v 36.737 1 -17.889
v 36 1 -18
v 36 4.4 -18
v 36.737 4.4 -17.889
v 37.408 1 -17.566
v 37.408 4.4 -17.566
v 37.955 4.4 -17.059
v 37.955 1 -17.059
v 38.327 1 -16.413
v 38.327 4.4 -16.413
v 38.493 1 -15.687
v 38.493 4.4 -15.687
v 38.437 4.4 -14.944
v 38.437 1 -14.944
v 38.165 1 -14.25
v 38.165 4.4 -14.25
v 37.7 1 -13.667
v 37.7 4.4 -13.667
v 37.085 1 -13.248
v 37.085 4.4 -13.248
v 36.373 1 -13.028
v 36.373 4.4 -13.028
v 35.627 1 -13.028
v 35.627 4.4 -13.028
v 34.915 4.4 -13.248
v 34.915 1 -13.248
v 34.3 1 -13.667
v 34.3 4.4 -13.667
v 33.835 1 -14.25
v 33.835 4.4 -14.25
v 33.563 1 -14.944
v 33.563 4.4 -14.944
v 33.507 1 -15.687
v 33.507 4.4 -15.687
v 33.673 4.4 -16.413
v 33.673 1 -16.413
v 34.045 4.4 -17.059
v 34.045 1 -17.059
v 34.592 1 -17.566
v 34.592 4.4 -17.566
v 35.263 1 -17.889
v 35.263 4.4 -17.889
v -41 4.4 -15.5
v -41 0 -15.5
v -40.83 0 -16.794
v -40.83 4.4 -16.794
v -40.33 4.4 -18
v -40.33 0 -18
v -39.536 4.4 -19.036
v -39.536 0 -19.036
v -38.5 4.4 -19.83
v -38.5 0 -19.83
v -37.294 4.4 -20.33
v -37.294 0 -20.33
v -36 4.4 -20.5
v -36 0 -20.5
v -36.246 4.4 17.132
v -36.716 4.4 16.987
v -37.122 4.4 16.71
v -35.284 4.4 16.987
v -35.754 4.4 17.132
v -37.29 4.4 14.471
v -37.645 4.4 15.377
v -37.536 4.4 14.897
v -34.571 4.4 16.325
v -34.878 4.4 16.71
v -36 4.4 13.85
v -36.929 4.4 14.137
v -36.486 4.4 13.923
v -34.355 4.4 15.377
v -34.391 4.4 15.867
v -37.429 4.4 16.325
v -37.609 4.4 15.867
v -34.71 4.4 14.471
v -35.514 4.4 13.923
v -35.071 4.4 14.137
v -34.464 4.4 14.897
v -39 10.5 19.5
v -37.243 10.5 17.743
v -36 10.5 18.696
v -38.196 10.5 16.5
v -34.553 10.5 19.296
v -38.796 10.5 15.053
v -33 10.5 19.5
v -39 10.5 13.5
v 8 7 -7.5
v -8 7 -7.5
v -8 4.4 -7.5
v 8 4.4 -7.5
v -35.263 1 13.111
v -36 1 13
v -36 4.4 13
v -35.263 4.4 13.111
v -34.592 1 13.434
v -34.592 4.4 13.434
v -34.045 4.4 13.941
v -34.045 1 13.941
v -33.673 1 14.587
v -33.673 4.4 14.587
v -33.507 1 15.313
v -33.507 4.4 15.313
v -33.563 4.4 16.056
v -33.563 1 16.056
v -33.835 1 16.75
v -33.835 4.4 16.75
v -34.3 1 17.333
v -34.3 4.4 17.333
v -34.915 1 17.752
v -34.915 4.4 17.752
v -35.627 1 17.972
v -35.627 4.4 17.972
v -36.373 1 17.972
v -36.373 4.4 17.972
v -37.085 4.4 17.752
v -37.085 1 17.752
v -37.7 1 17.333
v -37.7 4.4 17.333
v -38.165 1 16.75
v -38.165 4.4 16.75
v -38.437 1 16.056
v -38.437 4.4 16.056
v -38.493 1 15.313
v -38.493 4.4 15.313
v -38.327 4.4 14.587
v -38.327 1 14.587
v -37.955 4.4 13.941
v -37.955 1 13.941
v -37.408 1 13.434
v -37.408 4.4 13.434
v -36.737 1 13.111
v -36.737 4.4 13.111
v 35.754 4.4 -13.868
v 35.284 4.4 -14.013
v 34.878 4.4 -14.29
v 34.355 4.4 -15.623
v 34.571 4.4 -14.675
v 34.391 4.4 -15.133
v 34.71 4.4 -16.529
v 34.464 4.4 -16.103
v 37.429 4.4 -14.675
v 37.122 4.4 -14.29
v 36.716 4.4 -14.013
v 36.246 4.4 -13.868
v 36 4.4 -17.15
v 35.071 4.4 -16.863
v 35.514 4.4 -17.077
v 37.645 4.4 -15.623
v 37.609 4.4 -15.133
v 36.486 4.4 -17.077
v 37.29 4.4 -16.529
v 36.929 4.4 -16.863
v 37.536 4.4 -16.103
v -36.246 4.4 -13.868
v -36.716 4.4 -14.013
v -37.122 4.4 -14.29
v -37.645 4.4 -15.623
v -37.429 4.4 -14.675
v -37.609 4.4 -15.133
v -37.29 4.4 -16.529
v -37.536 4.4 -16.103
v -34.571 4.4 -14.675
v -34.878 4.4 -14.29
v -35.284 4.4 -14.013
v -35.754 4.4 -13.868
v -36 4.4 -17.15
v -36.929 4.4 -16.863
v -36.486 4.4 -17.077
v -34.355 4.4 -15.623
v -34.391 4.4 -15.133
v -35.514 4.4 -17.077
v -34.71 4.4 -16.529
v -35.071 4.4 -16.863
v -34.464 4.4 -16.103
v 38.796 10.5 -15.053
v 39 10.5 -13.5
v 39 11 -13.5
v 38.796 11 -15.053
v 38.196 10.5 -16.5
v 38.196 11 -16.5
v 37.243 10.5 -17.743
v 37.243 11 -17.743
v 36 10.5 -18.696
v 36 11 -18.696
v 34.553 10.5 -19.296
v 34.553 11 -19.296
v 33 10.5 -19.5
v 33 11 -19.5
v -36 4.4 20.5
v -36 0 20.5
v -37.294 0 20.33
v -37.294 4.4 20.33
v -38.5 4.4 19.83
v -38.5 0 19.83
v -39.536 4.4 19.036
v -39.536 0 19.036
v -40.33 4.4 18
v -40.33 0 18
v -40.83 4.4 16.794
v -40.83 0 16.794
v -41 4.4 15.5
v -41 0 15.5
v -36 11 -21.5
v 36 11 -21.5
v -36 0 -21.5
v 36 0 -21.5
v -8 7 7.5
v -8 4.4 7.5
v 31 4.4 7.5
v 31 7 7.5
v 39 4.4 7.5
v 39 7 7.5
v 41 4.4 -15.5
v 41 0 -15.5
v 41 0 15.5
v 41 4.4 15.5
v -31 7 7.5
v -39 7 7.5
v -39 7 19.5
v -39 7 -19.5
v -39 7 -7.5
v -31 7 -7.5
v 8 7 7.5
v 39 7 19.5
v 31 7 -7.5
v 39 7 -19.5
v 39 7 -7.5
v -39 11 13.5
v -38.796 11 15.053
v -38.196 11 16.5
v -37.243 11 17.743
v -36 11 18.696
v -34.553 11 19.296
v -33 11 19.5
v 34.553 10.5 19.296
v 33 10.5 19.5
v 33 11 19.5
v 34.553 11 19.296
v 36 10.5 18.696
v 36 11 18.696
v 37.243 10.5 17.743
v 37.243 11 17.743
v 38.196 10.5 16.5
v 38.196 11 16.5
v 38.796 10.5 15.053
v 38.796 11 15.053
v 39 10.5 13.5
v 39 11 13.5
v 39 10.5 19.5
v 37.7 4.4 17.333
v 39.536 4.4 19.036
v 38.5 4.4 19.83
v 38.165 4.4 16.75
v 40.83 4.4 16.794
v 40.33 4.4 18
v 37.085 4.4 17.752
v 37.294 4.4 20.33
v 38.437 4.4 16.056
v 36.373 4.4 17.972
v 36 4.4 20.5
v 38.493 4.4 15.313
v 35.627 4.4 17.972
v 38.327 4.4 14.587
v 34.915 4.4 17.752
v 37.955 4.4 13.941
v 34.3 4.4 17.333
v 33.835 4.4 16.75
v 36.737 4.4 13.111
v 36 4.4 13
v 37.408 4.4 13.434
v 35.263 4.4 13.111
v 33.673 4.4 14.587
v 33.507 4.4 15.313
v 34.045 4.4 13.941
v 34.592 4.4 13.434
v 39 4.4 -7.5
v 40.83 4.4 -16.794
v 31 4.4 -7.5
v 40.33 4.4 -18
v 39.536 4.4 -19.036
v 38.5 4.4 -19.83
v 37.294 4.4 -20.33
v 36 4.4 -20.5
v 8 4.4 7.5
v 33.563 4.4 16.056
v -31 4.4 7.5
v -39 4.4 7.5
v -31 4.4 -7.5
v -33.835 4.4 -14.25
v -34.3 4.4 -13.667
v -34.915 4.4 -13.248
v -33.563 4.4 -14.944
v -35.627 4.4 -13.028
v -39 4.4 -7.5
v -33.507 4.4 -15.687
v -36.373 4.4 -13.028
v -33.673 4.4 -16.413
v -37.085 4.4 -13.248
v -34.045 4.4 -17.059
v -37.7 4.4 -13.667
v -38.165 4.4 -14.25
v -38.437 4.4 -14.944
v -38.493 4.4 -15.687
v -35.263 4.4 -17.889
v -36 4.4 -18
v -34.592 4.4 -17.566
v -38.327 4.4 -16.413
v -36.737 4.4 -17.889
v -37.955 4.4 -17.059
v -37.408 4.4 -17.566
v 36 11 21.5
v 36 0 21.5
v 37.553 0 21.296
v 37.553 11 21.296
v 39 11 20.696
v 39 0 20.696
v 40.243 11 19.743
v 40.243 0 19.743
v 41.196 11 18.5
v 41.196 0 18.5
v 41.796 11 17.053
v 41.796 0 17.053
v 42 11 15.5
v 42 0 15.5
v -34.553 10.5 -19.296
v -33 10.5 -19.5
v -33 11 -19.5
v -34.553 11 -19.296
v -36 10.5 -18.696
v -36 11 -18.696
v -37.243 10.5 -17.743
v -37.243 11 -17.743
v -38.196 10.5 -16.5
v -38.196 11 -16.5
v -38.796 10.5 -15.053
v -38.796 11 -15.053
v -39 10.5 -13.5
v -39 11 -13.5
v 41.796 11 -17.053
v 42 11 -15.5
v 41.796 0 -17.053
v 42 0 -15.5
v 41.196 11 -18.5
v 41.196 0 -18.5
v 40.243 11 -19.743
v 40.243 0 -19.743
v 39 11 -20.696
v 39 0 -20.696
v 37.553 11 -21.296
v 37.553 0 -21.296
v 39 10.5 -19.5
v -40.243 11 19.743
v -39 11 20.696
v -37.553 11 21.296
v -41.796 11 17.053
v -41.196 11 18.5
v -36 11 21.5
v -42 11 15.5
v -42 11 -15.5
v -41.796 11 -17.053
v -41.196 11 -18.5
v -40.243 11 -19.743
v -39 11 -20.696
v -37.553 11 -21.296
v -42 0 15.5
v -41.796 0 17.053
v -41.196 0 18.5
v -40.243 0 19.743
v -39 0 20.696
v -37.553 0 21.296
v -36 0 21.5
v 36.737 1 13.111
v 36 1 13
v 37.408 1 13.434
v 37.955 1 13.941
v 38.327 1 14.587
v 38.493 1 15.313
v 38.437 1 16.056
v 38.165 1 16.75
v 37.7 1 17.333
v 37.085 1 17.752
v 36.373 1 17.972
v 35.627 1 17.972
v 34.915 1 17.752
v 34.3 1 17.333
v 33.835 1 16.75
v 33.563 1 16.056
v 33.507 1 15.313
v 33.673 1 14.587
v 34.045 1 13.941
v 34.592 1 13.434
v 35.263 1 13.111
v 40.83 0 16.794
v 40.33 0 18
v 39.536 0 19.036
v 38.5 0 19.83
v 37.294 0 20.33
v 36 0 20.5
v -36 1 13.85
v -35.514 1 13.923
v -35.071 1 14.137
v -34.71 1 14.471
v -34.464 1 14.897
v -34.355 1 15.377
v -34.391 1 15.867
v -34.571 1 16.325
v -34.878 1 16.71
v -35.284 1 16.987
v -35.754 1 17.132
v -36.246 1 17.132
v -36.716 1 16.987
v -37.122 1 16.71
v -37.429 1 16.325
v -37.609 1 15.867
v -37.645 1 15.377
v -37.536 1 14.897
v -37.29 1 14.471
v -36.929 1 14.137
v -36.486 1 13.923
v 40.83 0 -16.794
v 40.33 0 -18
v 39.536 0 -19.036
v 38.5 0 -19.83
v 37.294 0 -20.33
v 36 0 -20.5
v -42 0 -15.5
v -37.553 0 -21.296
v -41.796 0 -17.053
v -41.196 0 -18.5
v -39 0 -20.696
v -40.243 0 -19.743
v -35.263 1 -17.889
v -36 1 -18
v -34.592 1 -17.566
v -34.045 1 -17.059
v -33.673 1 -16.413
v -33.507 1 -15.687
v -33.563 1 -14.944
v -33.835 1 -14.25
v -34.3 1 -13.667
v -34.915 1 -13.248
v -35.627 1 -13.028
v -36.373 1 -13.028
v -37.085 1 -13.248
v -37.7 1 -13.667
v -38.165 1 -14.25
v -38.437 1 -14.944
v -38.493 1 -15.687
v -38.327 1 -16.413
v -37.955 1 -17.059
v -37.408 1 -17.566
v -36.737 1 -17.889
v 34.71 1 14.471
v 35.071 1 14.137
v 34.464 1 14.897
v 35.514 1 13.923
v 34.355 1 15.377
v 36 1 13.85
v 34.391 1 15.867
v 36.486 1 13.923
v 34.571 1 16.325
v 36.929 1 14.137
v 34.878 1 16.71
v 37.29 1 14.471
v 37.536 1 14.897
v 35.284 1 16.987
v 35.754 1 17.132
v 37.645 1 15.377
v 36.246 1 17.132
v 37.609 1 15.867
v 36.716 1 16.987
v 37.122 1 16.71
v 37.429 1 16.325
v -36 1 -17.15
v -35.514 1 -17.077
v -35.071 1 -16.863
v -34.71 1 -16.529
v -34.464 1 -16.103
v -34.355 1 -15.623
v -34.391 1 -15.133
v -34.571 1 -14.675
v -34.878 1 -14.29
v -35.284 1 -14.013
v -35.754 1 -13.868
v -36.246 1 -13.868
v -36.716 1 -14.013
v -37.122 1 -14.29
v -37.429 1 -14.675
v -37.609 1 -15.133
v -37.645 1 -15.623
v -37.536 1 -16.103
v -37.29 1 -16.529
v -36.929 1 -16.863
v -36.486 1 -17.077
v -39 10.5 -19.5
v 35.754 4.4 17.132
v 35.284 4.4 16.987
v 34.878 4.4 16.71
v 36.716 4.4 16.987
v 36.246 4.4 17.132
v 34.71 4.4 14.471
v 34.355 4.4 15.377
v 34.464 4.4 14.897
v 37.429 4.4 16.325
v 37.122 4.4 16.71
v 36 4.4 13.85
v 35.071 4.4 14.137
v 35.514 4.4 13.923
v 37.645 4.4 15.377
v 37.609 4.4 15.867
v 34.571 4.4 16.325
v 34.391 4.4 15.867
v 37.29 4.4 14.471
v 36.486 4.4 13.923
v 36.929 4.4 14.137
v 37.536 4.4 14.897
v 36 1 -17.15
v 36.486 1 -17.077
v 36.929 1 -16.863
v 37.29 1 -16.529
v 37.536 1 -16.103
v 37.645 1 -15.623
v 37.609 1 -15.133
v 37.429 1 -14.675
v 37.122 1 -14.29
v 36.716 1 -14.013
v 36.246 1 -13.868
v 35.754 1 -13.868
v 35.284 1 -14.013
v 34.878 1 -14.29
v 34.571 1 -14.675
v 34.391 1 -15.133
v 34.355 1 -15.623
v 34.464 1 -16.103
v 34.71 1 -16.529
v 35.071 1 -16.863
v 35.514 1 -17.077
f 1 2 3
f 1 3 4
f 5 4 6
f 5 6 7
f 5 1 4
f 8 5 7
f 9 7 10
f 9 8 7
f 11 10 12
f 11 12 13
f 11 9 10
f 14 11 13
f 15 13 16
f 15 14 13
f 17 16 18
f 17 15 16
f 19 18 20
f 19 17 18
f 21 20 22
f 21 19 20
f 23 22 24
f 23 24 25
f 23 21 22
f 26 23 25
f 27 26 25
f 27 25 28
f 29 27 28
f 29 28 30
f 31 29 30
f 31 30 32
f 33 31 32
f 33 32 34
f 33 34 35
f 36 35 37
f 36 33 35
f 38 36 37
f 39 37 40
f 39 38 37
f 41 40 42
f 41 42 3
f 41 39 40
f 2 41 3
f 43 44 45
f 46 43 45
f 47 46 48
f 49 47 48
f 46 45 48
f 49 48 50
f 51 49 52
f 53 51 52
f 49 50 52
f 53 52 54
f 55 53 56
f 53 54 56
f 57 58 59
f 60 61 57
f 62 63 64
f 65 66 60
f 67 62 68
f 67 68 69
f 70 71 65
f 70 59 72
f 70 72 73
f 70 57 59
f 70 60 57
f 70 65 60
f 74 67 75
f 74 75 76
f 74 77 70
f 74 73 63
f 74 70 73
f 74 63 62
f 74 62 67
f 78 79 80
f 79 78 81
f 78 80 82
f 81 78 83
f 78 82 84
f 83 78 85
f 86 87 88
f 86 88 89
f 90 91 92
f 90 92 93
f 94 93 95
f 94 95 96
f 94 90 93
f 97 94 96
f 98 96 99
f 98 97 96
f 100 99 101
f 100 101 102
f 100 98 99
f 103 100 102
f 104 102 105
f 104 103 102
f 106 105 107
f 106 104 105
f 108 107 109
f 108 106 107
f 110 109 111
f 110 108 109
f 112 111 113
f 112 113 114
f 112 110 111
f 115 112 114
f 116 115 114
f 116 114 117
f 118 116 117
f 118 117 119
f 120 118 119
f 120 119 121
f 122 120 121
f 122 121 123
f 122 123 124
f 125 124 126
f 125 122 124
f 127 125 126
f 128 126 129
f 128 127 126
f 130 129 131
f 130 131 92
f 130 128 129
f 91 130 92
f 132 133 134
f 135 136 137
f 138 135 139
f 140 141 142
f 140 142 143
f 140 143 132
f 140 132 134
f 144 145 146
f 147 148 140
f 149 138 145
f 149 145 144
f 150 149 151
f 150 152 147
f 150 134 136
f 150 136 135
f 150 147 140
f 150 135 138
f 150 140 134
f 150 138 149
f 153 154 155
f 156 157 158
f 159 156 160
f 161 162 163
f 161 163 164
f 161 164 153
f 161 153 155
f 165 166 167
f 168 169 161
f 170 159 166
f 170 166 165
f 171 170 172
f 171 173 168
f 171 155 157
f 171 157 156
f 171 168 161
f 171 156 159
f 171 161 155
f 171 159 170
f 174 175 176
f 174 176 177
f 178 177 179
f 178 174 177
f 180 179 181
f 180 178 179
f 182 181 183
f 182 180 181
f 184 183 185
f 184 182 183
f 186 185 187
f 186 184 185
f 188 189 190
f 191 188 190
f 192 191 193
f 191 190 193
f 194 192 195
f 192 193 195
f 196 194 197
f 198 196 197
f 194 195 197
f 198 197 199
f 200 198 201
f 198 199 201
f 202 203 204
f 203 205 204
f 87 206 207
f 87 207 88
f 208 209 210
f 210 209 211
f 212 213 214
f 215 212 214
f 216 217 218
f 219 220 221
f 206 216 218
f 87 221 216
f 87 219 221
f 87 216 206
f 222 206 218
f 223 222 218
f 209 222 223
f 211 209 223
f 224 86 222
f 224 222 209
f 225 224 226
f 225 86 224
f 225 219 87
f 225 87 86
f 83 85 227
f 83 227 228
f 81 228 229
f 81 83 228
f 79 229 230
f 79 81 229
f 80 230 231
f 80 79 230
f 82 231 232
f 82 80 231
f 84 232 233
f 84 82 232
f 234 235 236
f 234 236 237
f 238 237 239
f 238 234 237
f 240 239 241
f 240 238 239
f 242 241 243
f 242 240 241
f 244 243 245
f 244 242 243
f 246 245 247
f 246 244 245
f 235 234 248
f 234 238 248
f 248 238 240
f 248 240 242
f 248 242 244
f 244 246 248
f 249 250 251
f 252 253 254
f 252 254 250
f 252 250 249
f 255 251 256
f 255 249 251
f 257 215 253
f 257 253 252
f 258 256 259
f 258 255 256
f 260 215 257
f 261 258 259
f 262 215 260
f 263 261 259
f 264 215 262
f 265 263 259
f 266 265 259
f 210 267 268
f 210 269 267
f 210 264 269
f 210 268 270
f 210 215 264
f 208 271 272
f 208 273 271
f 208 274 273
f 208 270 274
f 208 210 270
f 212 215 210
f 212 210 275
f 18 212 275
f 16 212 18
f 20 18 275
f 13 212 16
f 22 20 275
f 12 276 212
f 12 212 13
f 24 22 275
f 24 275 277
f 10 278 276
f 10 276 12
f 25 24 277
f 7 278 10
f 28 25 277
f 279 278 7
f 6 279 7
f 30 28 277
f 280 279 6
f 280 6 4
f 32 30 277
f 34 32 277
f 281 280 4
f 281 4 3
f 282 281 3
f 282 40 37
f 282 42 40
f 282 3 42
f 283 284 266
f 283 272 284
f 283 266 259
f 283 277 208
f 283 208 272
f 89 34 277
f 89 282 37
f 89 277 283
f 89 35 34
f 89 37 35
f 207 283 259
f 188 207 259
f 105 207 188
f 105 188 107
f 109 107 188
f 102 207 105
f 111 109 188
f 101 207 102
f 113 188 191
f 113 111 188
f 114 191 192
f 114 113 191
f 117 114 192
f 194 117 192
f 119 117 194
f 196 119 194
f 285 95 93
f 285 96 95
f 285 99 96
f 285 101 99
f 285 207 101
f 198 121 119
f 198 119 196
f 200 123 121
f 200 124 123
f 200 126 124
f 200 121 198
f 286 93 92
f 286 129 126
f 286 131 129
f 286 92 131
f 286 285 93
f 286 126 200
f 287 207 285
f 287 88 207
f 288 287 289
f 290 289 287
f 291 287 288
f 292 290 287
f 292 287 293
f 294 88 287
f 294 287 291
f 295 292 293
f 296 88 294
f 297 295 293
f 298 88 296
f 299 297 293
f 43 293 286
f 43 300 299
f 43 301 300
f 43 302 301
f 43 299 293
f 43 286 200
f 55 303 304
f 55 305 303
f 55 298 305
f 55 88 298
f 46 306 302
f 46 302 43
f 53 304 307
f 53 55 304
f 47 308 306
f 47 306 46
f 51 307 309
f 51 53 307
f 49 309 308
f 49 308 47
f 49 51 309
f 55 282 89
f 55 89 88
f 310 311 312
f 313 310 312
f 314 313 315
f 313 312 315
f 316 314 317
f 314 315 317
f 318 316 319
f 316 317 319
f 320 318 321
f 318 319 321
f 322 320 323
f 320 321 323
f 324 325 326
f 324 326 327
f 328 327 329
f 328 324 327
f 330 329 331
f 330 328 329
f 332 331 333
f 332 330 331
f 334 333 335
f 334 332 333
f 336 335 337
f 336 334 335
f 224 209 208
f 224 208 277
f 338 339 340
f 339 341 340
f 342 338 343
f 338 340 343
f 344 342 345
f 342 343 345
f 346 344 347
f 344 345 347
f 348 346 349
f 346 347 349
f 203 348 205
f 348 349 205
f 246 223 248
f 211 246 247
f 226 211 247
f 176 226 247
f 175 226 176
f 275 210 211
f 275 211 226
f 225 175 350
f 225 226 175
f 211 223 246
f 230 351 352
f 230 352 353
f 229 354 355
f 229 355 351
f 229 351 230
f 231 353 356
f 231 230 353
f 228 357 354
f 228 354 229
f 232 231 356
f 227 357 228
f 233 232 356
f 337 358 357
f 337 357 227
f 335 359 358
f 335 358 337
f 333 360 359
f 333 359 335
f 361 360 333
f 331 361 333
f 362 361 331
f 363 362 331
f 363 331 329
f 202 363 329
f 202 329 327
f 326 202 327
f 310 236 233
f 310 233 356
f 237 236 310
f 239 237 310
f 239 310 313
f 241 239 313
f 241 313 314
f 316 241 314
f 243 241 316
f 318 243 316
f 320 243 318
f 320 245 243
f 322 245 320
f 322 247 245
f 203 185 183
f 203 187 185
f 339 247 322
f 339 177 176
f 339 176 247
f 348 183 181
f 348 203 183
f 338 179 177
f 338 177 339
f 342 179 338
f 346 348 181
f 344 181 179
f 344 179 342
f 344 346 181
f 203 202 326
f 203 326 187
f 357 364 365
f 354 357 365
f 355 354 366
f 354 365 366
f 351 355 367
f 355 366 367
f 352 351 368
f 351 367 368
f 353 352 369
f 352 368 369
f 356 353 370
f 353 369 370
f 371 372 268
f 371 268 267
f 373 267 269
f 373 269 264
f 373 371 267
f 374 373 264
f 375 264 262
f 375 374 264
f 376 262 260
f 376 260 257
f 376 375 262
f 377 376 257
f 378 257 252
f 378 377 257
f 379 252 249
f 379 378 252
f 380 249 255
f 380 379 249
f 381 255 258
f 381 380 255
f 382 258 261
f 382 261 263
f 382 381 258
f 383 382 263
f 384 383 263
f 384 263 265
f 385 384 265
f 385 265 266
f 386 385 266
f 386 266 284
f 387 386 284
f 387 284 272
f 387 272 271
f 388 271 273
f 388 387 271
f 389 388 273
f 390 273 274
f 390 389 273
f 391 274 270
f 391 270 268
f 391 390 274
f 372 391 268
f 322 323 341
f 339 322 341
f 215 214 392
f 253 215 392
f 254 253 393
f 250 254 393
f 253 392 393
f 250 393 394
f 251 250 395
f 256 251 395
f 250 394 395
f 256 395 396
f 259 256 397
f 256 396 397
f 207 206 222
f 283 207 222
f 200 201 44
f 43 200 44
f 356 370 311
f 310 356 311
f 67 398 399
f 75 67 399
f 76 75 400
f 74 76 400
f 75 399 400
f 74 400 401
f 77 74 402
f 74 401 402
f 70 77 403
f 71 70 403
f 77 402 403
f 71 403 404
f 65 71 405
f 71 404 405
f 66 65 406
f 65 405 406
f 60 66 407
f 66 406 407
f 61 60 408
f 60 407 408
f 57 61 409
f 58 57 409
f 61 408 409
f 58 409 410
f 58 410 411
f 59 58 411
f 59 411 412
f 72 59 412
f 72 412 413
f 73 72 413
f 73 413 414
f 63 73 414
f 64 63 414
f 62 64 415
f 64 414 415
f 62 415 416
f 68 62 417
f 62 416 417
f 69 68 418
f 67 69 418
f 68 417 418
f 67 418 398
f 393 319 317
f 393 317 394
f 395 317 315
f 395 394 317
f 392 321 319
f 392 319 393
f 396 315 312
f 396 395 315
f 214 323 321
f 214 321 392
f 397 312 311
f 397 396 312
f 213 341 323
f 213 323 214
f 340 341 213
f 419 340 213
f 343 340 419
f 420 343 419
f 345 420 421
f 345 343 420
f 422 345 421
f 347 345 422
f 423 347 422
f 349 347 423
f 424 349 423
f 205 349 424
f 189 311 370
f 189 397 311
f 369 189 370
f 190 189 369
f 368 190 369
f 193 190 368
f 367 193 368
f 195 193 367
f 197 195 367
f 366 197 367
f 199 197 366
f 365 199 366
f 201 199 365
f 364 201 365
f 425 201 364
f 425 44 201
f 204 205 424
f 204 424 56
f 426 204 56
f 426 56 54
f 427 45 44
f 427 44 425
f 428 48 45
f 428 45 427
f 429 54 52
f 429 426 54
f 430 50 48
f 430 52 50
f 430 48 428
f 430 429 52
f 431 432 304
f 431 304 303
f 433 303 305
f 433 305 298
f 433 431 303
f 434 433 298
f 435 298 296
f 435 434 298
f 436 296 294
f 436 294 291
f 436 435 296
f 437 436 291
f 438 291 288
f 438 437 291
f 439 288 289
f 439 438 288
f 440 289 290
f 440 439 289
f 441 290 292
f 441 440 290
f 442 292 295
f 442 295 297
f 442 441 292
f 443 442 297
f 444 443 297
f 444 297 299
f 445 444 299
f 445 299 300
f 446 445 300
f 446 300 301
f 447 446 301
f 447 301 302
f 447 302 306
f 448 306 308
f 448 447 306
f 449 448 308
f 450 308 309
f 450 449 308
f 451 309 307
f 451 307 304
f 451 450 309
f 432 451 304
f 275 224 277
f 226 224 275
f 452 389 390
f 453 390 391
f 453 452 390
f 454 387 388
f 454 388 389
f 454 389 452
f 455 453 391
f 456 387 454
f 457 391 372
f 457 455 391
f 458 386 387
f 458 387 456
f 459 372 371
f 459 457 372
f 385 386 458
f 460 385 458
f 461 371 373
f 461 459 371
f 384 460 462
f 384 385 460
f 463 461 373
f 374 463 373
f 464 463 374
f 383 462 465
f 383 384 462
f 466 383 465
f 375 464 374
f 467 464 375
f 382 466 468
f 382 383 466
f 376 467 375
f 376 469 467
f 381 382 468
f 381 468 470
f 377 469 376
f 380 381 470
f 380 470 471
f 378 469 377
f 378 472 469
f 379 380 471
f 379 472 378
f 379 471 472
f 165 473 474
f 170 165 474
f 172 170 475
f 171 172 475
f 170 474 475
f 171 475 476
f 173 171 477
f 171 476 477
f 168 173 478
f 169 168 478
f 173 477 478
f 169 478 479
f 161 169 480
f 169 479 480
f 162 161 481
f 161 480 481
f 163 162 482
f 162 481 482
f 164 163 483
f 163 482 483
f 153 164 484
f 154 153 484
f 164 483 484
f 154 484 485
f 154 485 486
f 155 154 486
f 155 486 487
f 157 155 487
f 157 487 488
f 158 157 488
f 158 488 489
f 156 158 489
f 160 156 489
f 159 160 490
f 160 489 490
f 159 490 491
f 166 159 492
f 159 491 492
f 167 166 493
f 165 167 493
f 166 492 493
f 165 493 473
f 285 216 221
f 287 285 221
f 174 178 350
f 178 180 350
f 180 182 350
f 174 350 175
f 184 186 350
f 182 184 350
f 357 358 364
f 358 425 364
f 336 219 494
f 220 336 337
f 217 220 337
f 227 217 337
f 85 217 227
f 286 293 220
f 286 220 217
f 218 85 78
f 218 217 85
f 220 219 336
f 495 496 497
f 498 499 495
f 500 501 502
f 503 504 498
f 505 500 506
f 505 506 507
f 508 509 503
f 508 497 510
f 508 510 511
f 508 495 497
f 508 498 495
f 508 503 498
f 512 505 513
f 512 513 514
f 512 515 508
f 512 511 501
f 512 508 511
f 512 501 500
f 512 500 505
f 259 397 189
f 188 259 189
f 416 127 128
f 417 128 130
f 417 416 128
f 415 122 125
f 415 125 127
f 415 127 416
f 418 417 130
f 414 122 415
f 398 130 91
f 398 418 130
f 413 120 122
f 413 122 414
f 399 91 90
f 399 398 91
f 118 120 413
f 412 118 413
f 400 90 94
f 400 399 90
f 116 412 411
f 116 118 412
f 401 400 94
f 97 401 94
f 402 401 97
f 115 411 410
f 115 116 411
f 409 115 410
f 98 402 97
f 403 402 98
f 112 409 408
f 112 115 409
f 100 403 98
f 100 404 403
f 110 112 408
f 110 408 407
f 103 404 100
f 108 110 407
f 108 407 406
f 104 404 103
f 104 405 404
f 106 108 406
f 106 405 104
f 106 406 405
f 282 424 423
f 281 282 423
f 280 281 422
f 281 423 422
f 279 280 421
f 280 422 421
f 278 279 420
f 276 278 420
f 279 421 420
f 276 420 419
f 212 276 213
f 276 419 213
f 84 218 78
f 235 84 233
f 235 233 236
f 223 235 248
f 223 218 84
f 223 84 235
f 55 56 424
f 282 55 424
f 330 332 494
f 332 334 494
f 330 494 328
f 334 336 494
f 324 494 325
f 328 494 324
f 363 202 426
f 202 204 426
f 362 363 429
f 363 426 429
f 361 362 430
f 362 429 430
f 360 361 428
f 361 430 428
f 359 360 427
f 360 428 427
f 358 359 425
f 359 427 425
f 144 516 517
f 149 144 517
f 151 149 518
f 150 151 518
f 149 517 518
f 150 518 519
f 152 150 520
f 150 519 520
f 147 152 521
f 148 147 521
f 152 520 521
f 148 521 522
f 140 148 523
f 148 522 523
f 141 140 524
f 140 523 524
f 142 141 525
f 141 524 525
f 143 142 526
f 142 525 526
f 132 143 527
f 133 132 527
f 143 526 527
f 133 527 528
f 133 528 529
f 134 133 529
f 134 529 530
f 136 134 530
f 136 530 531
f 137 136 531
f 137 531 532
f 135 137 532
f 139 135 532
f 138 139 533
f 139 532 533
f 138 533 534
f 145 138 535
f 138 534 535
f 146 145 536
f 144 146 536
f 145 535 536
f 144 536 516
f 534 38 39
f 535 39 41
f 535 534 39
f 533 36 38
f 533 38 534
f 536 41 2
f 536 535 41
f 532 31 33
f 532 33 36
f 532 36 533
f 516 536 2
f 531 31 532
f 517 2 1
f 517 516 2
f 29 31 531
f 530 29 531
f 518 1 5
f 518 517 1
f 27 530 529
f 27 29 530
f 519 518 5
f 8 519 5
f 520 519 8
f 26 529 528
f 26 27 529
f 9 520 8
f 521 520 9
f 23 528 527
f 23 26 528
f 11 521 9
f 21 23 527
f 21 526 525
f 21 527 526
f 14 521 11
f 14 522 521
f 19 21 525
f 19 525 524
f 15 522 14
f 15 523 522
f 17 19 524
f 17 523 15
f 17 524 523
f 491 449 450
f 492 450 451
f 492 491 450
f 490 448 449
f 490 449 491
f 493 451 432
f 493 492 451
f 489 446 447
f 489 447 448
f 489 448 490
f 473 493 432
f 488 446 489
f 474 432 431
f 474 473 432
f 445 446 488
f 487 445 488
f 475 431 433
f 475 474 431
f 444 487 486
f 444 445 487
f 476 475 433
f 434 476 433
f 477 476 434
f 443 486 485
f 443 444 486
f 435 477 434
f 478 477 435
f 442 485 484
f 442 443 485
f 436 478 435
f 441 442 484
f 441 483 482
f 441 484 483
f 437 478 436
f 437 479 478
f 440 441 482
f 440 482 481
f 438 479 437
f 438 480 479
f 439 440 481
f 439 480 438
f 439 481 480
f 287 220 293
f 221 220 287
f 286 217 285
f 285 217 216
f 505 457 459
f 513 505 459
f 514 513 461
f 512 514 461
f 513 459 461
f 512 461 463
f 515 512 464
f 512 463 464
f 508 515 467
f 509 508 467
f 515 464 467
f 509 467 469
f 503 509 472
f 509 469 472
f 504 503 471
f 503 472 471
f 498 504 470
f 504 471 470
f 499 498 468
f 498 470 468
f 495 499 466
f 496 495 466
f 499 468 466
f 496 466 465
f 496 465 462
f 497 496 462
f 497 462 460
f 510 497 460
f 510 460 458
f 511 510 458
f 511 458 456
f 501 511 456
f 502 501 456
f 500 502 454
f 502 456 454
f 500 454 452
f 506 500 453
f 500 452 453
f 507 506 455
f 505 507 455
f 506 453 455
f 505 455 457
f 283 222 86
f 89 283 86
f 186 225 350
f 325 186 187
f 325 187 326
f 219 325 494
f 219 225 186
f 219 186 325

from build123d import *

# Parameters (mm, degrees)
EXTRUDE_1_DEPTH     = 10.5
CUT_EXTRUDE_1_DEPTH = 1
SKETCH_3_R          = 2.5
SKETCH_3_R_2        = 1.65
CUT_EXTRUDE_2_DEPTH = 3.4
SKETCH_4_W          = 78
SKETCH_4_H          = 39
CUT_EXTRUDE_3_DEPTH = 3.5
SKETCH_5_W          = 8
SKETCH_5_H          = 15
CUT_EXTRUDE_4_DEPTH = 48.699580711
SKETCH_6_W          = 16
SKETCH_6_H          = 15
CUT_EXTRUDE_5_DEPTH = 48.699580711
EXTRUDE_2_DEPTH     = 0.5


with BuildPart() as part:
    # 草图1 → 凸台-拉伸1 (new body)
    with BuildSketch(Plane(origin=(0, 0, 0), x_dir=(1, 0, 0), z_dir=(0, 1, 0))):
        with BuildLine():
            Line((-36, 21.5), (36, 21.5))
            ThreePointArc((36, 21.5), (40.242640687, 19.742640687), (42, 15.5))
            Line((42, 15.5), (42, -15.5))
            ThreePointArc((42, -15.5), (40.242640687, -19.742640687), (36, -21.5))
            Line((36, -21.5), (-36, -21.5))
            ThreePointArc((-36, -21.5), (-40.242640687, -19.742640687), (-42, -15.5))
            Line((-42, -15.5), (-42, 15.5))
            ThreePointArc((-42, 15.5), (-40.242640687, 19.742640687), (-36, 21.5))
        make_face()
    extrude(amount=EXTRUDE_1_DEPTH)

    # 草图2 → 切除-拉伸1 (cut)
    with BuildSketch(Plane.XZ):
        with BuildLine():
            Line((36, 20.5), (-36, 20.5))
            ThreePointArc((-36, 20.5), (-39.535533906, 19.035533906), (-41, 15.5))
            Line((-41, 15.5), (-41, -15.5))
            ThreePointArc((-41, -15.5), (-39.535533906, -19.035533906), (-36, -20.5))
            Line((-36, -20.5), (36, -20.5))
            ThreePointArc((36, -20.5), (39.535533906, -19.035533906), (41, -15.5))
            Line((41, -15.5), (41, 15.5))
            ThreePointArc((41, 15.5), (39.535533906, 19.035533906), (36, 20.5))
        make_face()
    extrude(amount=-CUT_EXTRUDE_1_DEPTH, mode=Mode.SUBTRACT)

    # 草图3 → 切除-拉伸2 (cut)
    # profile 1 of 5: a face of its own
    with BuildSketch(Plane(origin=(0, 1, 0), x_dir=(-1, 0, 0), z_dir=(0, -1, 0))):
        with BuildLine():
            Line((-41, 15.5), (-41, -15.5))
            ThreePointArc((-41, -15.5), (-39.535533906, -19.035533906), (-36, -20.5))
            Line((-36, -20.5), (36, -20.5))
            ThreePointArc((36, -20.5), (39.535533906, -19.035533906), (41, -15.5))
            Line((41, -15.5), (41, 15.5))
            ThreePointArc((41, 15.5), (39.535533906, 19.035533906), (36, 20.5))
            Line((36, 20.5), (-36, 20.5))
            ThreePointArc((-36, 20.5), (-39.535533906, 19.035533906), (-41, 15.5))
        make_face()
        with Locations(Location((36, 15.5, 0), (0, 0, 90))):
            Circle(SKETCH_3_R, mode=Mode.SUBTRACT)
        with Locations(Location((36, -15.5, 0), (0, 0, 90))):
            Circle(SKETCH_3_R, mode=Mode.SUBTRACT)
        with Locations(Location((-36, 15.5, 0), (0, 0, 90))):
            Circle(SKETCH_3_R, mode=Mode.SUBTRACT)
        with Locations(Location((-36, -15.5, 0), (0, 0, 90))):
            Circle(SKETCH_3_R, mode=Mode.SUBTRACT)
    # profile 2 of 5: a face of its own
    with BuildSketch(Plane(origin=(0, 1, 0), x_dir=(-1, 0, 0), z_dir=(0, -1, 0))):
        with Locations(Location((36, 15.5, 0), (0, 0, 90))):
            Circle(SKETCH_3_R_2)
    # profile 3 of 5: a face of its own
    with BuildSketch(Plane(origin=(0, 1, 0), x_dir=(-1, 0, 0), z_dir=(0, -1, 0))):
        with Locations(Location((36, -15.5, 0), (0, 0, 90))):
            Circle(SKETCH_3_R_2)
    # profile 4 of 5: a face of its own
    with BuildSketch(Plane(origin=(0, 1, 0), x_dir=(-1, 0, 0), z_dir=(0, -1, 0))):
        with Locations(Location((-36, -15.5, 0), (0, 0, 90))):
            Circle(SKETCH_3_R_2)
    # profile 5 of 5: a face of its own
    with BuildSketch(Plane(origin=(0, 1, 0), x_dir=(-1, 0, 0), z_dir=(0, -1, 0))):
        with Locations(Location((-36, 15.5, 0), (0, 0, 90))):
            Circle(SKETCH_3_R_2)
    extrude(amount=-CUT_EXTRUDE_2_DEPTH, mode=Mode.SUBTRACT)

    # 草图4 → 切除-拉伸3 (cut)
    with BuildSketch(Plane(origin=(0, 10.5, 0), x_dir=(1, 0, 0), z_dir=(0, 1, 0))):
        Rectangle(SKETCH_4_W, SKETCH_4_H)
    extrude(amount=-CUT_EXTRUDE_3_DEPTH, mode=Mode.SUBTRACT)

    # 草图5 → 切除-拉伸4 (cut, through all)
    with BuildSketch(Plane(origin=(0, 7, 0), x_dir=(1, 0, 0), z_dir=(0, 1, 0))):
        with Locations((-35, 0)):
            Rectangle(SKETCH_5_W, SKETCH_5_H)
        with Locations((35, 0)):
            Rectangle(SKETCH_5_W, SKETCH_5_H)
    extrude(amount=-CUT_EXTRUDE_4_DEPTH, mode=Mode.SUBTRACT)

    # 草图6 → 切除-拉伸5 (cut, through all)
    with BuildSketch(Plane(origin=(0, 7, 0), x_dir=(1, 0, 0), z_dir=(0, 1, 0))):
        Rectangle(SKETCH_6_W, SKETCH_6_H)
    extrude(amount=-CUT_EXTRUDE_5_DEPTH, mode=Mode.SUBTRACT)

    # 草图7 → 凸台-拉伸2 (add)
    with BuildSketch(Plane(origin=(0, 10.5, 0), x_dir=(1, 0, 0), z_dir=(0, 1, 0))):
        with BuildLine():
            Line((42, -15.5), (42, 15.5))
            ThreePointArc((42, 15.5), (40.242640687, 19.742640687), (36, 21.5))
            Line((36, 21.5), (-36, 21.5))
            ThreePointArc((-36, 21.5), (-40.242640687, 19.742640687), (-42, 15.5))
            Line((-42, 15.5), (-42, -15.5))
            ThreePointArc((-42, -15.5), (-40.242640687, -19.742640687), (-36, -21.5))
            Line((-36, -21.5), (36, -21.5))
            ThreePointArc((36, -21.5), (40.242640687, -19.742640687), (42, -15.5))
        make_face()
        with BuildLine():
            Line((-33, -19.5), (33, -19.5))
            ThreePointArc((33, -19.5), (37.242640687, -17.742640687), (39, -13.5))
            Line((39, -13.5), (39, 13.5))
            ThreePointArc((39, 13.5), (37.242640687, 17.742640687), (33, 19.5))
            Line((33, 19.5), (-33, 19.5))
            ThreePointArc((-33, 19.5), (-37.242640687, 17.742640687), (-39, 13.5))
            Line((-39, 13.5), (-39, -13.5))
            ThreePointArc((-39, -13.5), (-37.242640687, -17.742640687), (-33, -19.5))
        make_face(mode=Mode.SUBTRACT)
    extrude(amount=EXTRUDE_2_DEPTH)


solid = part.part
